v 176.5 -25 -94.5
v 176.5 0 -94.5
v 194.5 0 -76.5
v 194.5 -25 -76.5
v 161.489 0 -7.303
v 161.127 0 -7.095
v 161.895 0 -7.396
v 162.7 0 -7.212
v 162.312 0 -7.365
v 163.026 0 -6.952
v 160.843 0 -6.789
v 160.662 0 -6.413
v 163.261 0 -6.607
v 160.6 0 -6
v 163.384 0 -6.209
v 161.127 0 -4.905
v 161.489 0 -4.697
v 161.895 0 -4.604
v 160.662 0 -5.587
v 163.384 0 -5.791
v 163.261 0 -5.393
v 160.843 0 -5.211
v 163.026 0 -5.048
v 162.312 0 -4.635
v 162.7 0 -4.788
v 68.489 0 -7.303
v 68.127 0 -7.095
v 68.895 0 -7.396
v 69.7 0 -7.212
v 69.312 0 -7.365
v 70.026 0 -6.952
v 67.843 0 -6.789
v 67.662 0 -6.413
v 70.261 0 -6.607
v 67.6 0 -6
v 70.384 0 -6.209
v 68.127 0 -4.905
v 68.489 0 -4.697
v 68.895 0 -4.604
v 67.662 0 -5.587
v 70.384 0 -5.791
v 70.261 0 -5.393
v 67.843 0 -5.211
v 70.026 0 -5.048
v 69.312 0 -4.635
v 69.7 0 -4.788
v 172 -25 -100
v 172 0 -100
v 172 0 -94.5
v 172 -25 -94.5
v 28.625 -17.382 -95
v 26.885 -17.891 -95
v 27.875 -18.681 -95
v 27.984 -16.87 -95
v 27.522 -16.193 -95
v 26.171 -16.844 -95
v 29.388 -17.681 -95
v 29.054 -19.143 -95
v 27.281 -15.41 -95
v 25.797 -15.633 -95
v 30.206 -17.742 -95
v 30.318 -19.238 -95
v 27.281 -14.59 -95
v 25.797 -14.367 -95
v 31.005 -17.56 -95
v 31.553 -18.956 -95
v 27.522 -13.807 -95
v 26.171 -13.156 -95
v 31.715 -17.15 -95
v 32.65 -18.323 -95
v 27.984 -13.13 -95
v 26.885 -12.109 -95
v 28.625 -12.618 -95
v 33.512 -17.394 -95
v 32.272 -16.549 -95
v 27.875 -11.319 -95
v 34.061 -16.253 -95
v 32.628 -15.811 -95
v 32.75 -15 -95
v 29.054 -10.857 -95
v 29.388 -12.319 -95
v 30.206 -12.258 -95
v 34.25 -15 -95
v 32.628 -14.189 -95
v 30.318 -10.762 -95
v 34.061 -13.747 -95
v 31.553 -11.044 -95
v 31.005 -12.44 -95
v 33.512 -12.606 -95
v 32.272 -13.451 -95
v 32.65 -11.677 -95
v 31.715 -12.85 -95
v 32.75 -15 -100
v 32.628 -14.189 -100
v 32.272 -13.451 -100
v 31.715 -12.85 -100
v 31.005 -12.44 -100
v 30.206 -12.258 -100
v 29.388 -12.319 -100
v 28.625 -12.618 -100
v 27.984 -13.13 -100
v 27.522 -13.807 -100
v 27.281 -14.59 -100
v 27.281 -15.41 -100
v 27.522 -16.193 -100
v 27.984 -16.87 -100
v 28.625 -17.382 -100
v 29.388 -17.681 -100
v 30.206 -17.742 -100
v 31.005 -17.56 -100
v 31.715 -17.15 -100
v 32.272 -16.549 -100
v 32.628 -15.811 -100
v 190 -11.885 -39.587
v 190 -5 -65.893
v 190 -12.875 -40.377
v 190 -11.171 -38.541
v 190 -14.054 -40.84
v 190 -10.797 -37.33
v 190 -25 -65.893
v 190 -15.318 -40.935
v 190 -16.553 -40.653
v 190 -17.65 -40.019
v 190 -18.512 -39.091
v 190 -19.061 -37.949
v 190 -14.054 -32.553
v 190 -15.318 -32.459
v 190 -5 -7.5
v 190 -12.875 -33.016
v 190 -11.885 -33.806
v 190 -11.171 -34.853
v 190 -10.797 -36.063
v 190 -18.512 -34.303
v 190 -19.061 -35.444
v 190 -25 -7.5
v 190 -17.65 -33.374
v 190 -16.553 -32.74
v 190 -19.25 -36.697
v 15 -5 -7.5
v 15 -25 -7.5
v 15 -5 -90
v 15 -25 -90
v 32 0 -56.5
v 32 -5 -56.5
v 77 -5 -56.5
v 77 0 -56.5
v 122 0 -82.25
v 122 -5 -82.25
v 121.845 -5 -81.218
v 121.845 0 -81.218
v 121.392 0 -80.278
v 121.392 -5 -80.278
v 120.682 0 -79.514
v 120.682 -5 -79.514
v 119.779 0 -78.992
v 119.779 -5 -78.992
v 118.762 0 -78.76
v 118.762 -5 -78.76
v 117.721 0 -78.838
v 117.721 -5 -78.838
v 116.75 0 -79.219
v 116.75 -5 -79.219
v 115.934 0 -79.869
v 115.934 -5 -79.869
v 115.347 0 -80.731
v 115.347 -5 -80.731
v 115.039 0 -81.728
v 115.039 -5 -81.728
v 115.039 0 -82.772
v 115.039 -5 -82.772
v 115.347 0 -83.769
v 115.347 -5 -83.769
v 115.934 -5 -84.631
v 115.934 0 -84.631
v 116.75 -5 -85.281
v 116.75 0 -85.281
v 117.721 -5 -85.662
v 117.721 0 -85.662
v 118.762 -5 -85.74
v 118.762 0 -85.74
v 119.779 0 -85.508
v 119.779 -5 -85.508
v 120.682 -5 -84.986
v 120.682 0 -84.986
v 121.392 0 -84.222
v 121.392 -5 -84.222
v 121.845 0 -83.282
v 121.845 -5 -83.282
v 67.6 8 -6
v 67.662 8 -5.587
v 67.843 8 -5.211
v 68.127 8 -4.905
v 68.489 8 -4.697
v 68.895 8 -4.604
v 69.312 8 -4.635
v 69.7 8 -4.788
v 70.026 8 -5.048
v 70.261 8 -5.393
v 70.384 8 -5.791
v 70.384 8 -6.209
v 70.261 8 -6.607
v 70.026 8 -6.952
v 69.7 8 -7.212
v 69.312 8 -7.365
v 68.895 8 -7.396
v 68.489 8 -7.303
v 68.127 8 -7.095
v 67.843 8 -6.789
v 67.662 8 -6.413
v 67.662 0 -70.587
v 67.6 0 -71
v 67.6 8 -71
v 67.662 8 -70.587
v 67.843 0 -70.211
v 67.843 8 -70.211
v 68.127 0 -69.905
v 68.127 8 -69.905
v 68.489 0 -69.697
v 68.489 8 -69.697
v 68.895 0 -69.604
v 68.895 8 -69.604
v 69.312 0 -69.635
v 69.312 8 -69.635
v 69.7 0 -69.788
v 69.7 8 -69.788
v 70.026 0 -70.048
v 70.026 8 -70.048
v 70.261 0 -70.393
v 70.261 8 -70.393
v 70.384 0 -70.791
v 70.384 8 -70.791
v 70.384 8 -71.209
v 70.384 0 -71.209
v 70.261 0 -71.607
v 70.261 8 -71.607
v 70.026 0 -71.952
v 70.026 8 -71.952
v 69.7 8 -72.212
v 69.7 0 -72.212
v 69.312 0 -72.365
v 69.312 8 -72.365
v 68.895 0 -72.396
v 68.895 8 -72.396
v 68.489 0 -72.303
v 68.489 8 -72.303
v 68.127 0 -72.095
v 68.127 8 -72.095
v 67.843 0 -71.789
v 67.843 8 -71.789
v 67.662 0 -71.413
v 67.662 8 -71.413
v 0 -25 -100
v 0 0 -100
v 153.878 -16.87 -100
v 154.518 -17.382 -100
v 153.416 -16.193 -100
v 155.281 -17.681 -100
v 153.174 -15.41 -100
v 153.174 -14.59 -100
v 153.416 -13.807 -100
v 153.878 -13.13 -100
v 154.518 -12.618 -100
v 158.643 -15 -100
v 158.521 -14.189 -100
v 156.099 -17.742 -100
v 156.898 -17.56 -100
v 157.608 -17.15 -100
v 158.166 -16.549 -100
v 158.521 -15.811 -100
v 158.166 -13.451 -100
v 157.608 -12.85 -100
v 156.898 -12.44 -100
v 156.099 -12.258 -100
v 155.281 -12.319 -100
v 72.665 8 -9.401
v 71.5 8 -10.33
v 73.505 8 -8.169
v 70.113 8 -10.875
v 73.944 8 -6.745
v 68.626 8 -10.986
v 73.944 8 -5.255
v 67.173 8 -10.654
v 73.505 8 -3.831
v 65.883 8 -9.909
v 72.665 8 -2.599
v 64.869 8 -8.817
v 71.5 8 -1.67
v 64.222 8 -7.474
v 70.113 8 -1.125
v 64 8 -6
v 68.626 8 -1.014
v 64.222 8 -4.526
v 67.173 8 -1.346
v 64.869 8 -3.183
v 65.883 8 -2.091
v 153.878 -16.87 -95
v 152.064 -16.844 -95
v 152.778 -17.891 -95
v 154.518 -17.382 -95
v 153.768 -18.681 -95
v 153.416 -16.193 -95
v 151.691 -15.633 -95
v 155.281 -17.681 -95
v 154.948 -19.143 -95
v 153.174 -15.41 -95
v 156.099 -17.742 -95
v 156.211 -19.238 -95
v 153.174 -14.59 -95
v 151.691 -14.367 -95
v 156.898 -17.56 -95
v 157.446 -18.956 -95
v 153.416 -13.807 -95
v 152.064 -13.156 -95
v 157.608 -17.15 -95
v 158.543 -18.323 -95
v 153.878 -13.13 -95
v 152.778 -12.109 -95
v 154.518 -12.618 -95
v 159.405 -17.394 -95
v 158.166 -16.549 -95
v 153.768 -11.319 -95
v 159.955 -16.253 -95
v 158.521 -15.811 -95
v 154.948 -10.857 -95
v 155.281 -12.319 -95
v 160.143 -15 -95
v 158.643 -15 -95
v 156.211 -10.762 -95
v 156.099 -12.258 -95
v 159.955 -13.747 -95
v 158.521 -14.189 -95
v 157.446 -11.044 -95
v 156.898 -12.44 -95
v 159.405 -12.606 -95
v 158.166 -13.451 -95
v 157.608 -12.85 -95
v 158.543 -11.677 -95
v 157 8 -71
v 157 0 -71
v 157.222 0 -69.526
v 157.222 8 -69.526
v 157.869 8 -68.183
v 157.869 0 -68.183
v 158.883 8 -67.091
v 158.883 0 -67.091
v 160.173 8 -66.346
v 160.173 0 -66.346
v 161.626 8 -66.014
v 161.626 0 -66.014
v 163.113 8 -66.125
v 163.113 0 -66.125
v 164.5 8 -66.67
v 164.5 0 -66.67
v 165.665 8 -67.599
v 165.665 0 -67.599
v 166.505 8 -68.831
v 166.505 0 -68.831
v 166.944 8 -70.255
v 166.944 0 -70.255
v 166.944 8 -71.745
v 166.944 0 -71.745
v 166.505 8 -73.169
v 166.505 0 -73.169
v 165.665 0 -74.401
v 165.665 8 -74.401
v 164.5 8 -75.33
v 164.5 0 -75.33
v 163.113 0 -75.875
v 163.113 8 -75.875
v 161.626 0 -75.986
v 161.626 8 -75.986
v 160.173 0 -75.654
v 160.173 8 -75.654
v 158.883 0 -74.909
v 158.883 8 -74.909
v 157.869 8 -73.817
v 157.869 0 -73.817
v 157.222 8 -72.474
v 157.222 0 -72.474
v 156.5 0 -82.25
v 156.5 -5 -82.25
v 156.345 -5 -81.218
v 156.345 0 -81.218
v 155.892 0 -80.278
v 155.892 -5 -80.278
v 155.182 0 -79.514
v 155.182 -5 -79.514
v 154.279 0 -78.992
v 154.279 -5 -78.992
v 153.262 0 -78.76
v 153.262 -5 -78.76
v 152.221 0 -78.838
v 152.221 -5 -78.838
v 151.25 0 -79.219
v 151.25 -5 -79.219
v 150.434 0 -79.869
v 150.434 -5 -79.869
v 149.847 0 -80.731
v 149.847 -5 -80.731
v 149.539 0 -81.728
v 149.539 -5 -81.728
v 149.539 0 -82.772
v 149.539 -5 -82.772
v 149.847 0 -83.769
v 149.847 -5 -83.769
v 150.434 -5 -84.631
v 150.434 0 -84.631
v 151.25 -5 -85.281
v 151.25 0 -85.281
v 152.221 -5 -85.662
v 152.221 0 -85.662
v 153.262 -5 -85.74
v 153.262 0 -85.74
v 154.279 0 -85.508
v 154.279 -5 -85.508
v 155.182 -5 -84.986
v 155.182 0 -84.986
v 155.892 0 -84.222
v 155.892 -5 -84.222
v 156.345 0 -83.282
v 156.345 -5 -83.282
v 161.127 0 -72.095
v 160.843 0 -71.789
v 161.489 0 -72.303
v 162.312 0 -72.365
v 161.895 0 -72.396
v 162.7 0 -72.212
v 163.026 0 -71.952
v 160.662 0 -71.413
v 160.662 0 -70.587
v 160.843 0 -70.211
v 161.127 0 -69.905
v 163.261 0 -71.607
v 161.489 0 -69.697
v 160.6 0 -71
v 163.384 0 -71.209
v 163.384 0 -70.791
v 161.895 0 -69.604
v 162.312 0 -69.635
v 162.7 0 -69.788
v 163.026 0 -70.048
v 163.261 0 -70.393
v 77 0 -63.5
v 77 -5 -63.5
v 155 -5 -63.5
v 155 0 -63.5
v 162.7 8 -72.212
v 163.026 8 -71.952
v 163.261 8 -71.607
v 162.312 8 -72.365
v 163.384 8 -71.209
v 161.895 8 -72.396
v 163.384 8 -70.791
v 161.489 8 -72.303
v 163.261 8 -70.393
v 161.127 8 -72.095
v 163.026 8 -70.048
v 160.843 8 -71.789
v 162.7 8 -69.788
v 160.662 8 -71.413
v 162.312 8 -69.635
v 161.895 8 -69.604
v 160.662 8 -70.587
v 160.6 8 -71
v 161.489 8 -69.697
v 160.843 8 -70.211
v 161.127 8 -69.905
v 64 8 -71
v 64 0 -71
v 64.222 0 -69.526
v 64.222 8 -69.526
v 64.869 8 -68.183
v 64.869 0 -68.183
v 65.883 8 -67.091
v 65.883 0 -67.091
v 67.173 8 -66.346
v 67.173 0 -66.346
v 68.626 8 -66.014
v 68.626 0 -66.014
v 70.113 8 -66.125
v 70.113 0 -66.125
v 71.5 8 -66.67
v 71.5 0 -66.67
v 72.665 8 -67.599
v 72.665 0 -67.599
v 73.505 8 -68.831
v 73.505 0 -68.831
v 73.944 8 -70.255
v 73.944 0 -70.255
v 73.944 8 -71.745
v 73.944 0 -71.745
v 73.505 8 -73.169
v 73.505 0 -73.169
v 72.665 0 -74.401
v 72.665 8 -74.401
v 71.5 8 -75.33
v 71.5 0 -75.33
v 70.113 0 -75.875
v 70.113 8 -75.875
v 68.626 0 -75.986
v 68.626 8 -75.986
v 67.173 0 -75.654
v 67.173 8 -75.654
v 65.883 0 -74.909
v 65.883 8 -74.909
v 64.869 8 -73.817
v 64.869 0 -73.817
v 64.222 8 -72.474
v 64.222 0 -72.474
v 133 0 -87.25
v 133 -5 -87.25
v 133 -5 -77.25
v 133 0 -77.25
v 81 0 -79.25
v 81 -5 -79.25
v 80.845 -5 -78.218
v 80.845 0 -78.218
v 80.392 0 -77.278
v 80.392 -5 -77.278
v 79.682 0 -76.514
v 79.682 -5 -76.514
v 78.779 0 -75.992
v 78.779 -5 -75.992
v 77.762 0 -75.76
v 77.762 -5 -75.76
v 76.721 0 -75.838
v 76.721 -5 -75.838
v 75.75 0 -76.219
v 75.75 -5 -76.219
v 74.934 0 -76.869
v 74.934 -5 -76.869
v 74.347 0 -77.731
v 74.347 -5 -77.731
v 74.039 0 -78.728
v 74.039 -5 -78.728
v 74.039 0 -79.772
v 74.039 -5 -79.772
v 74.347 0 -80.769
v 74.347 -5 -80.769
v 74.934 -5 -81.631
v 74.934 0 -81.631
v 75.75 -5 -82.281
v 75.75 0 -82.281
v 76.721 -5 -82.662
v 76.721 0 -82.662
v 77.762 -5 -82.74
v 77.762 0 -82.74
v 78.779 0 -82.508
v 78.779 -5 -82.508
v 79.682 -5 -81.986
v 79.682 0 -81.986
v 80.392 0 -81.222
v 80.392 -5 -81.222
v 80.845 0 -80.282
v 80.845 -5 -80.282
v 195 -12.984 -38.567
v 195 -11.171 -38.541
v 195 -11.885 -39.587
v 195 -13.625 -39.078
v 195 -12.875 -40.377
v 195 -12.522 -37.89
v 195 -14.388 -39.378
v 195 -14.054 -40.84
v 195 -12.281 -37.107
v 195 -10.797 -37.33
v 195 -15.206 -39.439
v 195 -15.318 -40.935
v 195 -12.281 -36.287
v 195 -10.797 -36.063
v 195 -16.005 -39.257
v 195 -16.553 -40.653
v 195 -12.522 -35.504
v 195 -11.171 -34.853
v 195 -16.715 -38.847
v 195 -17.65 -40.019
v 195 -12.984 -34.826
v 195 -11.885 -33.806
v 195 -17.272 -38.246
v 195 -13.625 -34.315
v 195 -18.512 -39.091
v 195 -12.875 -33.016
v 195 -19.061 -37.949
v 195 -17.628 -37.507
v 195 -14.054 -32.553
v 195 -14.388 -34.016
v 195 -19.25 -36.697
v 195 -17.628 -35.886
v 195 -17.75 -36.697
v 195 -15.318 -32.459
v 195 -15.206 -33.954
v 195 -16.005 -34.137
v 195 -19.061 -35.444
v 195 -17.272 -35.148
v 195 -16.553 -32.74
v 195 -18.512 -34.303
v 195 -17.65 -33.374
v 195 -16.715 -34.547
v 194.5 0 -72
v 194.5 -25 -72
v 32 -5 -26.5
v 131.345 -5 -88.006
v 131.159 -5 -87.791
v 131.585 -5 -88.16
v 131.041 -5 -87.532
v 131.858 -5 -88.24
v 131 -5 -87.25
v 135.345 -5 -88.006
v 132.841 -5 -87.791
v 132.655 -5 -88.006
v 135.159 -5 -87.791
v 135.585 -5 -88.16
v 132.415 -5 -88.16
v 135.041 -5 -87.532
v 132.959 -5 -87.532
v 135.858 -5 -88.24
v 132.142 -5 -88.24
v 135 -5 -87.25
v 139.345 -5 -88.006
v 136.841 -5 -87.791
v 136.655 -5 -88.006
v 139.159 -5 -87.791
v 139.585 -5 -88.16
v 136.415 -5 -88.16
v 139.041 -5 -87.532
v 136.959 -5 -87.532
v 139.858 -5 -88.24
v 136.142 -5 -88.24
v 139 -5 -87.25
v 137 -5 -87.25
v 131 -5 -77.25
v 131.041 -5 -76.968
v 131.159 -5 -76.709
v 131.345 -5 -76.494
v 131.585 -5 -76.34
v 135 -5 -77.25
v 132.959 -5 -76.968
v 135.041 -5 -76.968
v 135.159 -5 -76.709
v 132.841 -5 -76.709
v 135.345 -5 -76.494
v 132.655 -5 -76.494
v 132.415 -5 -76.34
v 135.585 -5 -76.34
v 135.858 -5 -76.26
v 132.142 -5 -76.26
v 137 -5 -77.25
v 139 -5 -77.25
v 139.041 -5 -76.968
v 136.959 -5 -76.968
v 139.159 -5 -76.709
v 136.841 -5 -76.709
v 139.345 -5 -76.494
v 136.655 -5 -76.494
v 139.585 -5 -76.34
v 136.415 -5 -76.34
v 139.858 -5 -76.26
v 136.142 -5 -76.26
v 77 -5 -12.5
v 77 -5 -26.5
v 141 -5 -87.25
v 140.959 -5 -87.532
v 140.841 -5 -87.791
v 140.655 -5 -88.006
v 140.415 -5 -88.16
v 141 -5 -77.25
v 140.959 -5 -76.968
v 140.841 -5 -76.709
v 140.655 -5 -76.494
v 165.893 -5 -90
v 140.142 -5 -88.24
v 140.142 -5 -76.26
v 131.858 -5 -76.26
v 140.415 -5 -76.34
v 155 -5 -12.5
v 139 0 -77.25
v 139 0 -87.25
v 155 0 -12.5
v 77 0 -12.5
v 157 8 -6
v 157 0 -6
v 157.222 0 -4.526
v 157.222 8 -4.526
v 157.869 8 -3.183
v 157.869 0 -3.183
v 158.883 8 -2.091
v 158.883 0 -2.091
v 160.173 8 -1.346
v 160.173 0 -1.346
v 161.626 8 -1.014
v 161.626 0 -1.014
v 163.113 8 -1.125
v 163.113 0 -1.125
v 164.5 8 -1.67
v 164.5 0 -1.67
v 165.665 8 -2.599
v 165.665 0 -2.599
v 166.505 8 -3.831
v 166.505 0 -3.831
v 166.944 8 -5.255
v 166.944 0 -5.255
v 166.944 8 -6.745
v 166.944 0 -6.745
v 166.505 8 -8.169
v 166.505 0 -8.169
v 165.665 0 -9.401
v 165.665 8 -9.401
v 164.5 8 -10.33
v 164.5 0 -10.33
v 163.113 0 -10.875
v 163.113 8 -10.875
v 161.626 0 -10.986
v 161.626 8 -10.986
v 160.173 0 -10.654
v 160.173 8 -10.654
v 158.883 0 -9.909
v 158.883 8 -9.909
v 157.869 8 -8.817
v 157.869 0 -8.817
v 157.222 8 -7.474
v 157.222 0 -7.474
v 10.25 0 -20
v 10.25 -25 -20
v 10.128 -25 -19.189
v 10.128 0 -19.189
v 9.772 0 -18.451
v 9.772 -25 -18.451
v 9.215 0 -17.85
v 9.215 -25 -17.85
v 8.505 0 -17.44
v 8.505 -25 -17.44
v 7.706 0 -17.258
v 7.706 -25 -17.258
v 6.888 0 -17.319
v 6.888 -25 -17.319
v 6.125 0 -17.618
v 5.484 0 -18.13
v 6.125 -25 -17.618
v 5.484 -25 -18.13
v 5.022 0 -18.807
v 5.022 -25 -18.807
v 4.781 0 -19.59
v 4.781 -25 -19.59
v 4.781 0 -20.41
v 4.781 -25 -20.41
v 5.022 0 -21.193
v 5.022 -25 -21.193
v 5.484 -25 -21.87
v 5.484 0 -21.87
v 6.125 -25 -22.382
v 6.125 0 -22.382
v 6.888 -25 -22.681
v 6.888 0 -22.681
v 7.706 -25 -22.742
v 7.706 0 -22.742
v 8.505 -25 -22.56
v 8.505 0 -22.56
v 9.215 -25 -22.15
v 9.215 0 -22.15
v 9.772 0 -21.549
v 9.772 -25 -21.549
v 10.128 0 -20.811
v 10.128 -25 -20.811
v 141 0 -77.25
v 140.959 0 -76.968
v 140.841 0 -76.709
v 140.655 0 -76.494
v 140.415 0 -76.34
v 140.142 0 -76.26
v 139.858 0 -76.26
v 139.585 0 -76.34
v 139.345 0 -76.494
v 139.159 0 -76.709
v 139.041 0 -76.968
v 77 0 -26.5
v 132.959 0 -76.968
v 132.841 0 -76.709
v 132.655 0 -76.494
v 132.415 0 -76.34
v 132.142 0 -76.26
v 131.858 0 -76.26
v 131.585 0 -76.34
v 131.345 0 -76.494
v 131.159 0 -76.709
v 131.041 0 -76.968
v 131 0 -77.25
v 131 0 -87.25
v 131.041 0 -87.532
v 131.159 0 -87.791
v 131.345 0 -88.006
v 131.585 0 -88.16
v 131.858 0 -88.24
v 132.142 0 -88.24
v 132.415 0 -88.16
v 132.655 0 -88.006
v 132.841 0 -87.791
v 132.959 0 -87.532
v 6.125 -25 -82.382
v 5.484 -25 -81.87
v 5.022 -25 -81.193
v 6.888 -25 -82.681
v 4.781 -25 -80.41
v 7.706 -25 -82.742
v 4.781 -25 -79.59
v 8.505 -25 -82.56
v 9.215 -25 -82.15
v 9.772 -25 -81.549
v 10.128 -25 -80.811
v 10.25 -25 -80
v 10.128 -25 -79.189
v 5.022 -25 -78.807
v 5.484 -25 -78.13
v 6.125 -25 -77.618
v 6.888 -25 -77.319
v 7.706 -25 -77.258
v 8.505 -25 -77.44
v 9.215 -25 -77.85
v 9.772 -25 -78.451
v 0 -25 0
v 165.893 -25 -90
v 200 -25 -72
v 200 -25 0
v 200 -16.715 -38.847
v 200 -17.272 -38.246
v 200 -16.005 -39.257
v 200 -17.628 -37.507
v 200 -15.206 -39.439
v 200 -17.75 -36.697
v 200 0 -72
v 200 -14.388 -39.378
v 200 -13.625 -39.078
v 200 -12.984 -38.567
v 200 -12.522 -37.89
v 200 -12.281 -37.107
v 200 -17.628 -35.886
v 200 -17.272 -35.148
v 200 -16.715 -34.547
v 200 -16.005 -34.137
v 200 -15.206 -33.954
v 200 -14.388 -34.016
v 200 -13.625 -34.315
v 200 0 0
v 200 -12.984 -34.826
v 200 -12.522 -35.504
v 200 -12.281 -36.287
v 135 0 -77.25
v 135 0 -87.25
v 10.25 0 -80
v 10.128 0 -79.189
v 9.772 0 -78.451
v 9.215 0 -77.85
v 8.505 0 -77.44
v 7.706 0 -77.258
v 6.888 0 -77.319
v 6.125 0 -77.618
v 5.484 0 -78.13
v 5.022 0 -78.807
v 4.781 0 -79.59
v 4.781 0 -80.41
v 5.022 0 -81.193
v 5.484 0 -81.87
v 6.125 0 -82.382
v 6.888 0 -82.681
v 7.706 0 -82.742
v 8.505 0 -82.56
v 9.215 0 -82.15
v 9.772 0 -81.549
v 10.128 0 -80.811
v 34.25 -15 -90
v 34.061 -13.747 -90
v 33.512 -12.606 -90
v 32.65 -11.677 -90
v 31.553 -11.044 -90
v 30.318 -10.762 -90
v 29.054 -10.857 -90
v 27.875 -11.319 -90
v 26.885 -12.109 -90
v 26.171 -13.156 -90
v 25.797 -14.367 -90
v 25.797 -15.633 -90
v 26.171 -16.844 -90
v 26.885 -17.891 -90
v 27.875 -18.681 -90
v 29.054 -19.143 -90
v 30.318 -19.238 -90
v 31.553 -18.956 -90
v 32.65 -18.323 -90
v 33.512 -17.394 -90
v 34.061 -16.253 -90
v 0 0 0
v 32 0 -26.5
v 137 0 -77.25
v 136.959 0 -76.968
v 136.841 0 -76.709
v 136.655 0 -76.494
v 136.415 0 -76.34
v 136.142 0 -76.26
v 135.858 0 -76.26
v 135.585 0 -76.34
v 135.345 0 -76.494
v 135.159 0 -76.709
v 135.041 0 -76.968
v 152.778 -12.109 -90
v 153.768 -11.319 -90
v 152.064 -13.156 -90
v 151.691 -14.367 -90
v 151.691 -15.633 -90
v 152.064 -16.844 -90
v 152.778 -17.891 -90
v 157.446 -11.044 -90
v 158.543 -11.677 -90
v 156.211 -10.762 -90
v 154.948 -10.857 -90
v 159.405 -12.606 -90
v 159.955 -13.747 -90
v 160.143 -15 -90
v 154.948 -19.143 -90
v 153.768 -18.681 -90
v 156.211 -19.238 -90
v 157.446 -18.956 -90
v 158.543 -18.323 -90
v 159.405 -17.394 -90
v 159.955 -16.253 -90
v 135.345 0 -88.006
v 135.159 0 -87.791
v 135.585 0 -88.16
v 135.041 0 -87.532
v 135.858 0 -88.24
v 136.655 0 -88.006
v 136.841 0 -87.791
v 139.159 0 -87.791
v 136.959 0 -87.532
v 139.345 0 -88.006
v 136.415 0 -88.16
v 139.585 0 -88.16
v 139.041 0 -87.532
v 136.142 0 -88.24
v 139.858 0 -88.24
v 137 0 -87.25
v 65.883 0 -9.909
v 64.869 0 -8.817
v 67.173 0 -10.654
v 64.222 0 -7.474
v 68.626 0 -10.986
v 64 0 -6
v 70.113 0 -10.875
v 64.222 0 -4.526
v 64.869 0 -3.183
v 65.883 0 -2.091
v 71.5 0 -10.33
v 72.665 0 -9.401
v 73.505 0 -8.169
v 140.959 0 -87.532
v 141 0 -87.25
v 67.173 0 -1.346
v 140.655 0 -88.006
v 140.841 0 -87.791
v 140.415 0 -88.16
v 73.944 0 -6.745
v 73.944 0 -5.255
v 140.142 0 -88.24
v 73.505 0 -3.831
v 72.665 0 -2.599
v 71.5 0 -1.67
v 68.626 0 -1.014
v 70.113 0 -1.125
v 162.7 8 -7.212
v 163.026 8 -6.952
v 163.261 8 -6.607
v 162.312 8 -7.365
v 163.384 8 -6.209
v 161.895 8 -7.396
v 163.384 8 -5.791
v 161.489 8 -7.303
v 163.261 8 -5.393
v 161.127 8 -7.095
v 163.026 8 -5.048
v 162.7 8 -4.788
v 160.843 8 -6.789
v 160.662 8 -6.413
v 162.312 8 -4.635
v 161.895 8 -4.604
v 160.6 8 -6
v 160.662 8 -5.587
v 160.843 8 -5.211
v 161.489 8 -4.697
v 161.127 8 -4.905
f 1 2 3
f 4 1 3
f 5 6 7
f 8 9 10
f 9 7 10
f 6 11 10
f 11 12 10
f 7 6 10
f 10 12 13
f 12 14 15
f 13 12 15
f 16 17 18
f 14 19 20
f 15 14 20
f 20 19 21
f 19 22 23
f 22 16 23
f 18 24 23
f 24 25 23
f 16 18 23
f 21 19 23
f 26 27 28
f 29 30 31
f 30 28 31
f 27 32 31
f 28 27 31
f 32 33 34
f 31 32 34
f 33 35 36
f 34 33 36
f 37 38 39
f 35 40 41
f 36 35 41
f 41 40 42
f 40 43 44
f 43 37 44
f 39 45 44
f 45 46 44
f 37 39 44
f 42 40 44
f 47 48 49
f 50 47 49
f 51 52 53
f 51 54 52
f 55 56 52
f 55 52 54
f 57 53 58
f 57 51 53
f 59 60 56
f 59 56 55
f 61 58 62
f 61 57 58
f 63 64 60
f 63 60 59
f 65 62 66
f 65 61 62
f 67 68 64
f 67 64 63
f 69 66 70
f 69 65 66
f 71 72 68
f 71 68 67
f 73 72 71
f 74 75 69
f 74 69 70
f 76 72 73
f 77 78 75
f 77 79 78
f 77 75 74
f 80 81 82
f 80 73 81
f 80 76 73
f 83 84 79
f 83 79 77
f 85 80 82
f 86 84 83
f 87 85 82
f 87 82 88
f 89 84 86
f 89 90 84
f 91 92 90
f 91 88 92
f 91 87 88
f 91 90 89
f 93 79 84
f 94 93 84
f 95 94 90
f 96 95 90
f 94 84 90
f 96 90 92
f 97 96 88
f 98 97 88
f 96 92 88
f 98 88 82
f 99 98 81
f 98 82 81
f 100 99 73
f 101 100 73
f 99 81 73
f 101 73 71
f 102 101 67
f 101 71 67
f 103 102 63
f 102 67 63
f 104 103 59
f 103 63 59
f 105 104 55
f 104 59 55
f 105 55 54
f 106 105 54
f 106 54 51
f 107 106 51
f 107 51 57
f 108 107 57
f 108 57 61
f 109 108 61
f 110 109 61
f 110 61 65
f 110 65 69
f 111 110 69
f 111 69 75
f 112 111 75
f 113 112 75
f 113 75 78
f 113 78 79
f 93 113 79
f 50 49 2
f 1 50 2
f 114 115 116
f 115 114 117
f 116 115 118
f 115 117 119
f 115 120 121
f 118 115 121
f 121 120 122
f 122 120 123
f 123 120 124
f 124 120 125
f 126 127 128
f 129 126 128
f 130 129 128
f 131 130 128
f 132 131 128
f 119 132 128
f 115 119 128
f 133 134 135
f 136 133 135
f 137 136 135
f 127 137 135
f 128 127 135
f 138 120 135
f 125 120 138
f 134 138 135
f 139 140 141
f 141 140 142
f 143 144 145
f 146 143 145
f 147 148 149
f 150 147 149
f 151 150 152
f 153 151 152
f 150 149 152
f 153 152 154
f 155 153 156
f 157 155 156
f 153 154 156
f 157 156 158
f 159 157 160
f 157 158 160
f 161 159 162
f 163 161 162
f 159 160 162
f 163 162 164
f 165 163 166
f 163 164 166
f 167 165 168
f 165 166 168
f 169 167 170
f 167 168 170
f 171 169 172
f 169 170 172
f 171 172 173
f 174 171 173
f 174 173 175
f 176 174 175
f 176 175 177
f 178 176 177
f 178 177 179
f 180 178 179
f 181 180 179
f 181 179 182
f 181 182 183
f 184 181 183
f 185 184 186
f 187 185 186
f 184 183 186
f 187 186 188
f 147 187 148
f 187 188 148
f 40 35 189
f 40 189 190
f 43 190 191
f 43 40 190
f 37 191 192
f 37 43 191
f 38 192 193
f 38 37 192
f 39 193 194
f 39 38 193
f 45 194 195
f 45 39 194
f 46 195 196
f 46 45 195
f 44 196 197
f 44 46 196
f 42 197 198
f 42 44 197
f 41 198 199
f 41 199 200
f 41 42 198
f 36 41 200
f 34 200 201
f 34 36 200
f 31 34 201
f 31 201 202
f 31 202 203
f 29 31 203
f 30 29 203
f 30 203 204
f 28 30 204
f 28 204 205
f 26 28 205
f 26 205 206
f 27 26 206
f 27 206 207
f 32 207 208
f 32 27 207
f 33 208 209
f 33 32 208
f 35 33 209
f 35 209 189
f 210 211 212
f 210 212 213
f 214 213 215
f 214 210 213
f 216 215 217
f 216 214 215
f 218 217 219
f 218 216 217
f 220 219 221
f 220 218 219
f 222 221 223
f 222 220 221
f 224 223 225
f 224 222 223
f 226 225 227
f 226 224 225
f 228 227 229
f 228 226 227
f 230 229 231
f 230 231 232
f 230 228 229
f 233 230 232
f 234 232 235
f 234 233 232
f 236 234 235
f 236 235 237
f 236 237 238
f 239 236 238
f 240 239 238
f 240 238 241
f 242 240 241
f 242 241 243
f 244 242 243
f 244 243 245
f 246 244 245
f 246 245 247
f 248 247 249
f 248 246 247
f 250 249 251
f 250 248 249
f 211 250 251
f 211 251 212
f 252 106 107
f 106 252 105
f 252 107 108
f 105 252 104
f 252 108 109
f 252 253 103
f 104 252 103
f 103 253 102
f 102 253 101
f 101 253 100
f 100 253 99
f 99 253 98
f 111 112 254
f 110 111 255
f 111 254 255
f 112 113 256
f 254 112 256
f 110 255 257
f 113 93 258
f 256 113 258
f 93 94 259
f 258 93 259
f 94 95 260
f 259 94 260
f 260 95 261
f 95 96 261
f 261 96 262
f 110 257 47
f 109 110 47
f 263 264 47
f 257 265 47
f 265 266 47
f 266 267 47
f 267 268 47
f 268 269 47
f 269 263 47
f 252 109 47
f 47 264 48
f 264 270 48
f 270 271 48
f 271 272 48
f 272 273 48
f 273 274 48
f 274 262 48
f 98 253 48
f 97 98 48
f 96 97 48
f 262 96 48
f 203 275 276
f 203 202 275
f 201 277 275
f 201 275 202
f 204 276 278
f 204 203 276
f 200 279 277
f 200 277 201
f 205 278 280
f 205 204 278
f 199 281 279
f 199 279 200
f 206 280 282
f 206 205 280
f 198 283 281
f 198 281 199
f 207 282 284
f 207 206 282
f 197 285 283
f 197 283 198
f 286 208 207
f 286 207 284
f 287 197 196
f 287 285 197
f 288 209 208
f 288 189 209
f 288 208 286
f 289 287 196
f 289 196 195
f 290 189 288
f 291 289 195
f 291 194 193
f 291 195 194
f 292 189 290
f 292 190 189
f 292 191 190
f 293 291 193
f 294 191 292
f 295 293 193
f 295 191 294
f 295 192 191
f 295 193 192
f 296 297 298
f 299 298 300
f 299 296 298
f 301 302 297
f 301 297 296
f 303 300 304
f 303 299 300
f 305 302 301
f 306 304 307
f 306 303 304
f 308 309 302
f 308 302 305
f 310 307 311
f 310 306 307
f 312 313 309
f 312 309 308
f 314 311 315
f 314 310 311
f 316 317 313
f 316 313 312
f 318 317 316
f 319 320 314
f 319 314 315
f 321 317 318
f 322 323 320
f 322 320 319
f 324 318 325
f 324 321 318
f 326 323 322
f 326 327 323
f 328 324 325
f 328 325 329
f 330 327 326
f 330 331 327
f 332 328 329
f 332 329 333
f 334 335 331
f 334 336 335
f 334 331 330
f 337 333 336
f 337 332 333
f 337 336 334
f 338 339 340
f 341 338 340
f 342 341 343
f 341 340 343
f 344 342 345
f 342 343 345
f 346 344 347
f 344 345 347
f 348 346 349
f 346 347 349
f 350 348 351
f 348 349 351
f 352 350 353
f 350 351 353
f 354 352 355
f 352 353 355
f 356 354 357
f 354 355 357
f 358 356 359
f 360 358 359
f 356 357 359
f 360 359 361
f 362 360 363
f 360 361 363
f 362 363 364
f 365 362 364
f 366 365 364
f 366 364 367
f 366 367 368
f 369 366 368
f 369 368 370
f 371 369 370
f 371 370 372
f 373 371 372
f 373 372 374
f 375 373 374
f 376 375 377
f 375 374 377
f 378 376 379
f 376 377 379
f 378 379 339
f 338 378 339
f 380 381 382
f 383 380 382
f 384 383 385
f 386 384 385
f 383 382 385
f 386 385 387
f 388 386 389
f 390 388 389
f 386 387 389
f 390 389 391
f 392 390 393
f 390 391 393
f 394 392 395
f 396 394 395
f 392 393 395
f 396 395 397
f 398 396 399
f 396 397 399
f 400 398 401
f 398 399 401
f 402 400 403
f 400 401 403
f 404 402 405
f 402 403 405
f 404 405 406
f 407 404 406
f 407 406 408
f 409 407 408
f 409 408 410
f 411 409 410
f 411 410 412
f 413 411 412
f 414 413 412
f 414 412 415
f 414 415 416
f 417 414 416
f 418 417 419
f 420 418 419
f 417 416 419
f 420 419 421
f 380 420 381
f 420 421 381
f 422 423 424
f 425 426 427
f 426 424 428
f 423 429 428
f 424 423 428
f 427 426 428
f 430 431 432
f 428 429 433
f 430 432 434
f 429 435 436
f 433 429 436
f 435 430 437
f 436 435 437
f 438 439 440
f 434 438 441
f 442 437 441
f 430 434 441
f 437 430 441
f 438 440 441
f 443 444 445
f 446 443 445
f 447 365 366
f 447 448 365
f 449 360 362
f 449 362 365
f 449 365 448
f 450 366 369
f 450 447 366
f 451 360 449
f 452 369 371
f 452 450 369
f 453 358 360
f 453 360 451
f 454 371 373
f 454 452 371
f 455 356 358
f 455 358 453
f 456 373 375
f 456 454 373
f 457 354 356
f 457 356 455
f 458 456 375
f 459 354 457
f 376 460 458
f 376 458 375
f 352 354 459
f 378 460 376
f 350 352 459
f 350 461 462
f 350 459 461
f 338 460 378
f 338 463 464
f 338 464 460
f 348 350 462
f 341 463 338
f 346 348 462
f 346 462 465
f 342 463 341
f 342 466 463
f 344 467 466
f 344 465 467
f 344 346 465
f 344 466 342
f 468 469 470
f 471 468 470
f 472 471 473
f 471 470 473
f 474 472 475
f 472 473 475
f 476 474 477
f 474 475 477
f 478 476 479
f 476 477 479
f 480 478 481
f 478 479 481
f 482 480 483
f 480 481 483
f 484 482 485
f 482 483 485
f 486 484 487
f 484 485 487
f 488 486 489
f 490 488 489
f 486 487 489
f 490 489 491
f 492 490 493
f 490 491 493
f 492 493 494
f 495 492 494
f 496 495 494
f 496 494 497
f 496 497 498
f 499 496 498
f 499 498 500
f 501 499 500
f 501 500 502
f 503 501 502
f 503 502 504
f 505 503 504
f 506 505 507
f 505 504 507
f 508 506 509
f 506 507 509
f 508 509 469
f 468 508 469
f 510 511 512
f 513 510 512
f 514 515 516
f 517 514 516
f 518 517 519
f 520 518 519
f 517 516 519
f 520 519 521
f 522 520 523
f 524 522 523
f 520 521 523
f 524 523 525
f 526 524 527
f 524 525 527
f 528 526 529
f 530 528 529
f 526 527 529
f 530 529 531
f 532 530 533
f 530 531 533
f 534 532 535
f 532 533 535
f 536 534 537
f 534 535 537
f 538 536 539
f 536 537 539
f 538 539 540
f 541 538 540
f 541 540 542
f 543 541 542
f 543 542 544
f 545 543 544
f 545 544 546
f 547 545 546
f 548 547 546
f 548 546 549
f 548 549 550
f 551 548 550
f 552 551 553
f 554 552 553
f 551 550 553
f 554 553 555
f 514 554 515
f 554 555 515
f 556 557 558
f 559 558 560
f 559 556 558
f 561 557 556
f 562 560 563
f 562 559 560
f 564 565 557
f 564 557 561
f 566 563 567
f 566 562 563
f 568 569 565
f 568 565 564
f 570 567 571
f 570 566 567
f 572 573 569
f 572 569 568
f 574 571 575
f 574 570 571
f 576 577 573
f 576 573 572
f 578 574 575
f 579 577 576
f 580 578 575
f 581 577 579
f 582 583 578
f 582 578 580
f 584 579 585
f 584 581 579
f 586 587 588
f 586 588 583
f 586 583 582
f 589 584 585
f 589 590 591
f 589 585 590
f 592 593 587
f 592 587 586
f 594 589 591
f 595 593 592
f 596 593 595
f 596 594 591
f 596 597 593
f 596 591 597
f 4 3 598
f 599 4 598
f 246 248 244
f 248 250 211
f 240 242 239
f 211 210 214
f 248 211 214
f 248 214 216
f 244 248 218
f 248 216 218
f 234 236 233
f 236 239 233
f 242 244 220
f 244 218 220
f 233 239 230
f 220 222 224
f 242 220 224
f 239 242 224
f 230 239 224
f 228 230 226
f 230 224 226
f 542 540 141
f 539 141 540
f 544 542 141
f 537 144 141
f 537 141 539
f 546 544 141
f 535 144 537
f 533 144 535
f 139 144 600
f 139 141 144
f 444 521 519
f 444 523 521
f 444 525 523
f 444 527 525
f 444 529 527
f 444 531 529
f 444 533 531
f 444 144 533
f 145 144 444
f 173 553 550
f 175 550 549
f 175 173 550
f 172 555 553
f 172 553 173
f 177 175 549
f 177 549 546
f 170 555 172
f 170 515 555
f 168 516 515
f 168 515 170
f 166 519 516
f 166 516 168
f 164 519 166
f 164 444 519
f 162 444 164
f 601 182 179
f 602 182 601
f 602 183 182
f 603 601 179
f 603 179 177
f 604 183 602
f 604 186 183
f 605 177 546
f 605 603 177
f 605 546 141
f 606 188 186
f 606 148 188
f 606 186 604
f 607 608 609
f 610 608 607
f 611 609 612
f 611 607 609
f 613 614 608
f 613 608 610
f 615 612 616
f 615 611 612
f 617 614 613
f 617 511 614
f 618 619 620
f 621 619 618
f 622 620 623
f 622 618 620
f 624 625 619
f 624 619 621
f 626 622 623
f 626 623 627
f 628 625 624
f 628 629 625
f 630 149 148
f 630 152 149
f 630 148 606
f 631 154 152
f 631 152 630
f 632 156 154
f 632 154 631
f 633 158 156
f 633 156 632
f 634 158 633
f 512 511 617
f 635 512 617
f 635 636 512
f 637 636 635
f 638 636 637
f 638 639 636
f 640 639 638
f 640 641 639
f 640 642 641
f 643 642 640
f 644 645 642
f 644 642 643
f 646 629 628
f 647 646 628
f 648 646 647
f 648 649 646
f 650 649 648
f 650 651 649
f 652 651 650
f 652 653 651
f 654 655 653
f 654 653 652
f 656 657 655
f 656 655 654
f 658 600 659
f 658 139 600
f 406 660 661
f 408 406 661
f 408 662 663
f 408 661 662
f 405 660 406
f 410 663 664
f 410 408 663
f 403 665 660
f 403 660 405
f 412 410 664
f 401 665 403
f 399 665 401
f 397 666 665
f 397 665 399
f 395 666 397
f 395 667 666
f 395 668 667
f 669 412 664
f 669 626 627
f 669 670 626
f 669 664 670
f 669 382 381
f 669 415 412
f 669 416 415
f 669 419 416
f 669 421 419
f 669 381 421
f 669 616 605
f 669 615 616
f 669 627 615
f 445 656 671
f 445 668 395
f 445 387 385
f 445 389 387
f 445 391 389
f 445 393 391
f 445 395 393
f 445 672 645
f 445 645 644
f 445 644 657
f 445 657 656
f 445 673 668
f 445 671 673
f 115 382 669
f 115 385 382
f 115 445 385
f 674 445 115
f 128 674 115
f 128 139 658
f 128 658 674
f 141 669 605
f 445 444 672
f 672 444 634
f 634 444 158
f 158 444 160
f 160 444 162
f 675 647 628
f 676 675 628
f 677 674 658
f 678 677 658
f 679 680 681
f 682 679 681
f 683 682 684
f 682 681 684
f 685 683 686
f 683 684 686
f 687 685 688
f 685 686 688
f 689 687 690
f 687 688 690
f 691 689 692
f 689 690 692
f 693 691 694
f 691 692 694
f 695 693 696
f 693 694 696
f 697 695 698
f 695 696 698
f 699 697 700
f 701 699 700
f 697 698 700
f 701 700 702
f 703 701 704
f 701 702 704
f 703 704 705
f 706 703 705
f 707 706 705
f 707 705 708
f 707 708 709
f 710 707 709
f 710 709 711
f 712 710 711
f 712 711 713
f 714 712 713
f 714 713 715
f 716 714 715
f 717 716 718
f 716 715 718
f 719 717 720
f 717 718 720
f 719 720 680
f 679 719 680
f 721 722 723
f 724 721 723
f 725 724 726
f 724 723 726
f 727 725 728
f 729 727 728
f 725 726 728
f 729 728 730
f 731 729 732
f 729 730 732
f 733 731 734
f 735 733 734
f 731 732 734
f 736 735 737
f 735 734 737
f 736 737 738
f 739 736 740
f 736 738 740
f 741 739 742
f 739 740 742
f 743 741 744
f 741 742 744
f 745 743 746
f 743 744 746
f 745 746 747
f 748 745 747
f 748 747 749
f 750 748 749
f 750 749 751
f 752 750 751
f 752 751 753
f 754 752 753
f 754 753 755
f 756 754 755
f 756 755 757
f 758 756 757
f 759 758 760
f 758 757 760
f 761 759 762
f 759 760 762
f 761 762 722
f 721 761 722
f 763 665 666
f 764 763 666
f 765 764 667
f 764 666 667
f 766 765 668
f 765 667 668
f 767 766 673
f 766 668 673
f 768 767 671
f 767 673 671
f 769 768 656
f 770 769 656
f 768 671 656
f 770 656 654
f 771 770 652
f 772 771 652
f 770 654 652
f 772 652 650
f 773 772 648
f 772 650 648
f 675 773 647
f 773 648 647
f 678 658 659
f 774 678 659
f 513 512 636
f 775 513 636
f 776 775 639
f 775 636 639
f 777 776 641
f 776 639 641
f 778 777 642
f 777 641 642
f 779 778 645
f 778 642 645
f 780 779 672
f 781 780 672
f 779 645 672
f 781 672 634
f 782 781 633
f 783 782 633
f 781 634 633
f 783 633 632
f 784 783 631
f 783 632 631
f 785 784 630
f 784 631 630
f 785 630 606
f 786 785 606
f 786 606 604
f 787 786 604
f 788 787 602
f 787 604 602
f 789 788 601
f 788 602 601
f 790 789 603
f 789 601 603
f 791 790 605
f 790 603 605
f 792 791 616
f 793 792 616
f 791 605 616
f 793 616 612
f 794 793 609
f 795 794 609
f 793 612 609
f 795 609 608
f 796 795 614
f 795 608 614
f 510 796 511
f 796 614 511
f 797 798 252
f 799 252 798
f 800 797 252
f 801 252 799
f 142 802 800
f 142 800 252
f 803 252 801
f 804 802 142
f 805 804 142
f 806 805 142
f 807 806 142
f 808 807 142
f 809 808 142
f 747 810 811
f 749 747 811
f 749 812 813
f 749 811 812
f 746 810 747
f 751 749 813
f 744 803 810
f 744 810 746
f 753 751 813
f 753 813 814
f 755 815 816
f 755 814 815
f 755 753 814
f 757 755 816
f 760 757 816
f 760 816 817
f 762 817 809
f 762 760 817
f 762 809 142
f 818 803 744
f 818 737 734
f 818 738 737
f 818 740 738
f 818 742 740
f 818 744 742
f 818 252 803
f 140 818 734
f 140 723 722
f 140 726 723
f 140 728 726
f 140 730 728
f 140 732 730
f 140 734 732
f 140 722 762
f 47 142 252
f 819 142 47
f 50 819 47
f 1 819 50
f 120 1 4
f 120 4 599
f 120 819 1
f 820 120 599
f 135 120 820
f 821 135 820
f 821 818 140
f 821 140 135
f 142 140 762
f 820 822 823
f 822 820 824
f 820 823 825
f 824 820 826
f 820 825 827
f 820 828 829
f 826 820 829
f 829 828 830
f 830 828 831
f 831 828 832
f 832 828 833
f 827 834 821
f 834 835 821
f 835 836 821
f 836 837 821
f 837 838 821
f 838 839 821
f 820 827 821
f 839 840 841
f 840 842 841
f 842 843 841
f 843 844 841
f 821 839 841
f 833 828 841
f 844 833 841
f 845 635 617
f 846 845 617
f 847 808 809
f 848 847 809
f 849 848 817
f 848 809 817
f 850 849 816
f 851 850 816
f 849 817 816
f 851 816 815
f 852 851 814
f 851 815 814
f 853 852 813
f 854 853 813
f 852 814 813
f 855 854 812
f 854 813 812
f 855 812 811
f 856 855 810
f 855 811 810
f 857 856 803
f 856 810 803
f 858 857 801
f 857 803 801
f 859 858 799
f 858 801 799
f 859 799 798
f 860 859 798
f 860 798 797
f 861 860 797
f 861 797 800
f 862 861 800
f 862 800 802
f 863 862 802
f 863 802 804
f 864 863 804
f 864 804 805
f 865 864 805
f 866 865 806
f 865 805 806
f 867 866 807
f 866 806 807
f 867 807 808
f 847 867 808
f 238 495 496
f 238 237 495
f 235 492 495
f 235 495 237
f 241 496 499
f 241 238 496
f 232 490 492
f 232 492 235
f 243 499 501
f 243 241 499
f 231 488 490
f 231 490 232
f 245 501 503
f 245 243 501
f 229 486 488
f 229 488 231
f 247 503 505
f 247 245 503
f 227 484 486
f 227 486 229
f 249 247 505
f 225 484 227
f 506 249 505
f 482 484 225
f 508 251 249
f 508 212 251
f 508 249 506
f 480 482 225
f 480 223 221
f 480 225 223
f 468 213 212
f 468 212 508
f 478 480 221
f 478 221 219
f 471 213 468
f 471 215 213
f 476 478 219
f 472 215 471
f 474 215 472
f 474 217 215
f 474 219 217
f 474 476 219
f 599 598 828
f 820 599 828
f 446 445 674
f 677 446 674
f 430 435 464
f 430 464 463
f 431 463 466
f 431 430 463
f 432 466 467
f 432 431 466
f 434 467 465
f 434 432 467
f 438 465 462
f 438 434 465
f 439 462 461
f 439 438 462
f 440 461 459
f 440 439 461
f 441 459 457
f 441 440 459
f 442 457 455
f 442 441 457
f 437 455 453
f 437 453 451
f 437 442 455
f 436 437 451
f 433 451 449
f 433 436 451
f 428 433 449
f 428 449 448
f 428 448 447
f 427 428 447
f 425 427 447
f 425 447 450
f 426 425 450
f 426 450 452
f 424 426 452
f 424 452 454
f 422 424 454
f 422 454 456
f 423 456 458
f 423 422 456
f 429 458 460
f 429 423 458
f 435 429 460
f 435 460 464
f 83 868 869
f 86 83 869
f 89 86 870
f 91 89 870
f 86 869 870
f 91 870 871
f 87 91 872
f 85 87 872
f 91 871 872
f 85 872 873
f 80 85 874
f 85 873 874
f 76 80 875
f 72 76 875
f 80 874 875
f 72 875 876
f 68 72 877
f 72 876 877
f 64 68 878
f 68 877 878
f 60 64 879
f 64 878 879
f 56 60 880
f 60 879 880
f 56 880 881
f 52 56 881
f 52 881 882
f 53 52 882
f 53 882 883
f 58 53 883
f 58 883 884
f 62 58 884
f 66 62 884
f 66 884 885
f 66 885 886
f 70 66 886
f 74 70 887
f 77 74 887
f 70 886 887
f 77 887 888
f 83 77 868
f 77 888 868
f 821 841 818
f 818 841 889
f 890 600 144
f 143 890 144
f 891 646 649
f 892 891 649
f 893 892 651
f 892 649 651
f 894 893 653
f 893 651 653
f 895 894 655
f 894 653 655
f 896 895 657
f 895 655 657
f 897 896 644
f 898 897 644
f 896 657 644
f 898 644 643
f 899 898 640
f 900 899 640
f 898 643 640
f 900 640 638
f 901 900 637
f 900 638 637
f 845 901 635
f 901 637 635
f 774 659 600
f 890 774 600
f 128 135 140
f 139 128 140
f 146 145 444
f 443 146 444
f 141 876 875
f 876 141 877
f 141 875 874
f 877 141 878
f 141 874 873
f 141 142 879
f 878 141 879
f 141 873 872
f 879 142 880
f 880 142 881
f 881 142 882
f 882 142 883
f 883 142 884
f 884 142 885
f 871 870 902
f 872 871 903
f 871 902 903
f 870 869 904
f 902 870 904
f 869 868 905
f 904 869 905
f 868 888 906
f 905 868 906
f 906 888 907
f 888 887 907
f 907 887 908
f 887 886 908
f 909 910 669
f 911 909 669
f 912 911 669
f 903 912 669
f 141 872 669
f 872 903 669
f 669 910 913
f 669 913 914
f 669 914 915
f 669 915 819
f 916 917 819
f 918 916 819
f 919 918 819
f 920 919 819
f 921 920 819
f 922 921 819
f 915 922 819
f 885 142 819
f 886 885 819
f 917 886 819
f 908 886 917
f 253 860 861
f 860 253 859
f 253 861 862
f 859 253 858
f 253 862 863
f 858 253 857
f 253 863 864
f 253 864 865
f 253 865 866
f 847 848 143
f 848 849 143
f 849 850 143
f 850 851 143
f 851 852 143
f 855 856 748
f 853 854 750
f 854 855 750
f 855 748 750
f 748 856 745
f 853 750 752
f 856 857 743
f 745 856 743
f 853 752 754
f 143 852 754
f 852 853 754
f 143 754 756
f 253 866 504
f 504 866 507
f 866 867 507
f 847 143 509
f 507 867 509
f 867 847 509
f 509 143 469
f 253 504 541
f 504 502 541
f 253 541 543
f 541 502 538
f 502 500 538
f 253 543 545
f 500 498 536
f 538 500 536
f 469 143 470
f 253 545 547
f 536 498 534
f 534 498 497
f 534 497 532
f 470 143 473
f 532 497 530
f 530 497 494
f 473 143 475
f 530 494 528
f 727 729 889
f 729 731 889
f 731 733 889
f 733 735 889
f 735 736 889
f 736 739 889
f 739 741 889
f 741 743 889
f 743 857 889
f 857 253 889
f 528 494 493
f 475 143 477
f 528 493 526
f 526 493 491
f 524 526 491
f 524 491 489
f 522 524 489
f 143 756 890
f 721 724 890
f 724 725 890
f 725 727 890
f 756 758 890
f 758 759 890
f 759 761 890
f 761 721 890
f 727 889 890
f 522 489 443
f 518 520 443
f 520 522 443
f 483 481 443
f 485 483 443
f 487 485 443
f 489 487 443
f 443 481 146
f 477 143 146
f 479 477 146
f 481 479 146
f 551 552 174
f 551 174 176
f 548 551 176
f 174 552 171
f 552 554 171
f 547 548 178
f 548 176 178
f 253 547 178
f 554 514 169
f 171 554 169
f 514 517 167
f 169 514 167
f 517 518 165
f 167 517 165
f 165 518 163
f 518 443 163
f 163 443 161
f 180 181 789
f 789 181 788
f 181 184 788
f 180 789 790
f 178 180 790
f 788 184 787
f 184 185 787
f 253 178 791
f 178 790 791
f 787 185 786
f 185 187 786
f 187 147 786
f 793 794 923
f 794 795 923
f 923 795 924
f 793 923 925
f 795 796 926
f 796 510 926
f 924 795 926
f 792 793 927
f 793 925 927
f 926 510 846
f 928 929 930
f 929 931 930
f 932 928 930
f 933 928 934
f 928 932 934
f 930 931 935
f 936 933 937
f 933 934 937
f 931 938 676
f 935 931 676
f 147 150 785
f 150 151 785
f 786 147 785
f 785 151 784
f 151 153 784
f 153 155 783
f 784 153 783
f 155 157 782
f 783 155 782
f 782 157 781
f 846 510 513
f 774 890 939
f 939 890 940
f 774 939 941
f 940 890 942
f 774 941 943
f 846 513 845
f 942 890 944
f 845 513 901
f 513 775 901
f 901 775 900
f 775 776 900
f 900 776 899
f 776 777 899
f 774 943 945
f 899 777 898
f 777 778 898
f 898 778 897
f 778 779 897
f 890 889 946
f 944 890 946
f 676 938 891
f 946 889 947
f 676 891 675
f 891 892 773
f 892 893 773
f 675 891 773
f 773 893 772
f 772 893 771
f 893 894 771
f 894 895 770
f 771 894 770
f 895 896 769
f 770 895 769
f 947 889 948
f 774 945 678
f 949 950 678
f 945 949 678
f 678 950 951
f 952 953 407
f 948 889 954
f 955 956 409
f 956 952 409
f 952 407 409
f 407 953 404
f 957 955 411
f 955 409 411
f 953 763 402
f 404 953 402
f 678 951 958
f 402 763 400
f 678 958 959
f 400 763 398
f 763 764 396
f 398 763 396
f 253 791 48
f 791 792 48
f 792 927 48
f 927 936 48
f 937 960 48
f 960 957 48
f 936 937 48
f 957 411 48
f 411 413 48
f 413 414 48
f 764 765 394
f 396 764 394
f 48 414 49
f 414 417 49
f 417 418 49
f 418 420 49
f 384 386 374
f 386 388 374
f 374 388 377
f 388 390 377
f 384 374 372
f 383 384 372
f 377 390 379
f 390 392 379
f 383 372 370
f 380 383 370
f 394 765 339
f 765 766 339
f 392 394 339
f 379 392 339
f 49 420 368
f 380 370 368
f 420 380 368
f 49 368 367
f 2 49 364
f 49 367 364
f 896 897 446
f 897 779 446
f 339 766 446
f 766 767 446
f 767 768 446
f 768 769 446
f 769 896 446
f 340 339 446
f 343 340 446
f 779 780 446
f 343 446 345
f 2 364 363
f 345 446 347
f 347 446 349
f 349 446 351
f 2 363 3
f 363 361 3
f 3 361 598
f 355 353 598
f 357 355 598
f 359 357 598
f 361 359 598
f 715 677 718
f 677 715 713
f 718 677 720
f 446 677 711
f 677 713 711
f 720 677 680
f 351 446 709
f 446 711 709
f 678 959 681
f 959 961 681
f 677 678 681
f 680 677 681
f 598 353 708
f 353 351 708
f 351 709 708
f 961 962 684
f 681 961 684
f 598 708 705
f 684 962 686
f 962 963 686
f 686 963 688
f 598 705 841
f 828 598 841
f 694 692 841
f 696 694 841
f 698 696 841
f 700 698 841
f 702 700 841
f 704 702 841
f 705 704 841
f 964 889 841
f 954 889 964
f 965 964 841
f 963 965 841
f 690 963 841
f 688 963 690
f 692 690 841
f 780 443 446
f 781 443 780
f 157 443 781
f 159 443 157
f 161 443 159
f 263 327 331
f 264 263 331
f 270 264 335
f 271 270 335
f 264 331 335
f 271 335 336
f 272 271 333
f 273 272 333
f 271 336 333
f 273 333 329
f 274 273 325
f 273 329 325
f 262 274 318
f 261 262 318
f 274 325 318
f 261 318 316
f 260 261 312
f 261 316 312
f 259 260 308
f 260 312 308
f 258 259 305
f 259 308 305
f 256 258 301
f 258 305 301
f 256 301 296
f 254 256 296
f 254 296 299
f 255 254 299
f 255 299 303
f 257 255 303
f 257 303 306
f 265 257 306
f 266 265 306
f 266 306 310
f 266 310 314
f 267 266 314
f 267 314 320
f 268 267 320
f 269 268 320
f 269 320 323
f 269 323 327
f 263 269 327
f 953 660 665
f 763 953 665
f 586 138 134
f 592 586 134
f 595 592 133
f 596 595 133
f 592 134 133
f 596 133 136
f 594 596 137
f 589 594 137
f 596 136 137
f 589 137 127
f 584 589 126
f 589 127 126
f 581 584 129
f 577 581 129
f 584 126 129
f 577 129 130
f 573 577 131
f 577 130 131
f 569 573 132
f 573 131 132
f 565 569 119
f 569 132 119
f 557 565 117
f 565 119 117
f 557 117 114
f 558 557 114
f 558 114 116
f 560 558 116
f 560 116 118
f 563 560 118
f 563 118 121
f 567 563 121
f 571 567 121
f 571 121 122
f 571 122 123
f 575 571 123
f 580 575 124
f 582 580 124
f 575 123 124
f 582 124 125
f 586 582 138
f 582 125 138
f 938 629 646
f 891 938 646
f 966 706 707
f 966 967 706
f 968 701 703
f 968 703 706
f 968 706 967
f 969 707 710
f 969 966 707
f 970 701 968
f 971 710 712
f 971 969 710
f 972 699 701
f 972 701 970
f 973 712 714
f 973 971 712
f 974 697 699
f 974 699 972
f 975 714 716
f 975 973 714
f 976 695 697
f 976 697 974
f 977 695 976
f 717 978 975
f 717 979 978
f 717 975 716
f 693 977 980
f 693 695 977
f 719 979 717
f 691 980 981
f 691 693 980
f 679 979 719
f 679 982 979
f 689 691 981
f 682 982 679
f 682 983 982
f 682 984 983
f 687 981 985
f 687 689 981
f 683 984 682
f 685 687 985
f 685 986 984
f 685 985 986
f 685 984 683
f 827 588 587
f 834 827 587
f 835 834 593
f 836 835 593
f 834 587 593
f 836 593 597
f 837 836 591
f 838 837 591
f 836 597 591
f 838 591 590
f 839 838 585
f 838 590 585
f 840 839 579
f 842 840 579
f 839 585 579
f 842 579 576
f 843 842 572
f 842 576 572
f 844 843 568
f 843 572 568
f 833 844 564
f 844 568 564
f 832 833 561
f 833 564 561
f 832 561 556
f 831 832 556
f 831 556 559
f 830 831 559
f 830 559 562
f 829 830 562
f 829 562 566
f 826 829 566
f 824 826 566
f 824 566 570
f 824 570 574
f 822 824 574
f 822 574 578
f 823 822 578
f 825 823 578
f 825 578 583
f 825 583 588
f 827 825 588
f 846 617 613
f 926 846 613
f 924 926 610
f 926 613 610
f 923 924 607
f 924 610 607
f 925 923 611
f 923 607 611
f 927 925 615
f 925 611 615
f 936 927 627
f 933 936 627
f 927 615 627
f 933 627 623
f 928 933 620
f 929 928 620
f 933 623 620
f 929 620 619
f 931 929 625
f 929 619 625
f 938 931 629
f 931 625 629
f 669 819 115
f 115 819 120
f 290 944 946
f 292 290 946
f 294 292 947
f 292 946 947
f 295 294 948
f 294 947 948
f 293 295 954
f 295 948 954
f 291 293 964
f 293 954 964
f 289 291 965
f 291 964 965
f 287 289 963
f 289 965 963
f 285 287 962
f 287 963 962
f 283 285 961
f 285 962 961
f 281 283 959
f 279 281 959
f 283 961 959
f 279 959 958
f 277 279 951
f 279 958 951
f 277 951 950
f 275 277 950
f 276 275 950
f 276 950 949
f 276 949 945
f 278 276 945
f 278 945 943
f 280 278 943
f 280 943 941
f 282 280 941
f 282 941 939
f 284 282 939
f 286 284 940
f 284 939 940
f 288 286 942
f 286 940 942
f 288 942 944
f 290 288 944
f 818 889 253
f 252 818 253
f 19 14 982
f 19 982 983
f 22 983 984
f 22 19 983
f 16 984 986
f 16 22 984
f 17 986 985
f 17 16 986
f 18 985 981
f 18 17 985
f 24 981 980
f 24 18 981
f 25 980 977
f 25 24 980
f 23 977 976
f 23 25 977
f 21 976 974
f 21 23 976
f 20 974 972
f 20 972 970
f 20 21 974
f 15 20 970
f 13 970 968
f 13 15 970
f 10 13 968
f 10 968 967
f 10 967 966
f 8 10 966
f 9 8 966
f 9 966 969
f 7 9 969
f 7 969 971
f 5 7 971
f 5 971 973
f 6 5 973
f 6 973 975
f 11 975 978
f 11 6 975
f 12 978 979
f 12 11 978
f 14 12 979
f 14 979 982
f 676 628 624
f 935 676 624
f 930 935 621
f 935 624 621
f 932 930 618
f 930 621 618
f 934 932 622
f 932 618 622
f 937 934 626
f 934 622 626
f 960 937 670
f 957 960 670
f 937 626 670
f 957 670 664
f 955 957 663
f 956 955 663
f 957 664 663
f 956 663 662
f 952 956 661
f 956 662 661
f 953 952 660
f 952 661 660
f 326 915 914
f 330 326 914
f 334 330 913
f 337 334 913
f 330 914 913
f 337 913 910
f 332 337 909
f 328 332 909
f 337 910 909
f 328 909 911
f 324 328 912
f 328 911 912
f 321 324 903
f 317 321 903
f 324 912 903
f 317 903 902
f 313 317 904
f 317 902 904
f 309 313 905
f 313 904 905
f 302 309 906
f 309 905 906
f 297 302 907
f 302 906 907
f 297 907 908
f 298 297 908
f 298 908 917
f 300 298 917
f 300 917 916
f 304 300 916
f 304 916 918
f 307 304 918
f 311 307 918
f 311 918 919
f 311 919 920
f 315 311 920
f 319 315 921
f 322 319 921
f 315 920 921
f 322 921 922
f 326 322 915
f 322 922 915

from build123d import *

# Parameters (mm, degrees)
F1_DEPTH  = 25
F3_DEPTH  = 20
F4_R      = 3.5
F5_DEPTH  = 5
F6_R      = 5
F6_R_2    = 1.4
F7_DEPTH  = 8
F8_R      = 2.75
F9_DEPTH  = 10
F10_R     = 4.25
F11_DEPTH = 5
F12_R     = 2.75
F13_DEPTH = 10
F14_R     = 4.25
F15_DEPTH = 5
F16_R     = 2.75
F17_DEPTH = 25


with BuildPart() as f1:
    # F0 (on Front) → F1 (new body)
    with BuildSketch(Plane.XZ):
        Polygon((200, 0), (0, 0), (0, -100), (172, -100), (172, -94.5), (176.5, -94.5), (194.5, -76.5), (194.5, -72), (200, -72), align=None)
    extrude(amount=F1_DEPTH)

    # F2 (on face) → F3 (cut)
    with BuildSketch(Plane.XZ.offset(25)):
        Polygon((190, -7.5), (15, -7.5), (15, -90), (165.893398, -90), (190, -65.893398), align=None)
    extrude(amount=-F3_DEPTH, mode=Mode.SUBTRACT)

    # F4 (on face) → F5 (cut, through all)
    with BuildSketch(Plane.XZ.offset(5)):
        Polygon((155, -12.5), (77, -12.5), (77, -26.5), (32, -26.5), (32, -56.5), (77, -56.5), (77, -63.5), (155, -63.5), align=None)
        with Locations((153, -82.25)):
            Circle(F4_R)
        with Locations((118.5, -82.25)):
            Circle(F4_R)
        with BuildLine():
            Line((133, -82.25), (133, -77.25))
            ThreePointArc((133, -77.25), (132, -76.25), (131, -77.25))
            Line((131, -77.25), (131, -82.25))
            Line((131, -82.25), (131, -87.25))
            ThreePointArc((131, -87.25), (132, -88.25), (133, -87.25))
            Line((133, -87.25), (133, -82.25))
        make_face()
        with BuildLine():
            ThreePointArc((137, -77.25), (136, -76.25), (135, -77.25))
            Line((135, -77.25), (135, -82.25))
            Line((135, -82.25), (135, -87.25))
            ThreePointArc((135, -87.25), (136, -88.25), (137, -87.25))
            Line((137, -87.25), (137, -82.25))
            Line((137, -82.25), (137, -77.25))
        make_face()
        with BuildLine():
            ThreePointArc((141, -77.25), (140, -76.25), (139, -77.25))
            Line((139, -77.25), (139, -82.25))
            Line((139, -82.25), (139, -87.25))
            ThreePointArc((139, -87.25), (140, -88.25), (141, -87.25))
            Line((141, -87.25), (141, -82.25))
            Line((141, -82.25), (141, -77.25))
        make_face()
        with Locations((77.5, -79.25)):
            Circle(F4_R)
    extrude(amount=-F5_DEPTH, mode=Mode.SUBTRACT)

    # F6 (on face) → F7 (join)
    with BuildSketch(Plane(origin=(0, 0, 0), x_dir=(-1, 0, 0), z_dir=(0, 1, 0))):
        with Locations((-69, -6)):
            Circle(F6_R)
        with Locations((-69, -6)):
            Circle(F6_R_2, mode=Mode.SUBTRACT)
        with Locations((-162, -6)):
            Circle(F6_R)
        with Locations((-162, -6)):
            Circle(F6_R_2, mode=Mode.SUBTRACT)
        with Locations((-162, -71)):
            Circle(F6_R)
        with Locations((-162, -71)):
            Circle(F6_R_2, mode=Mode.SUBTRACT)
        with Locations((-69, -71)):
            Circle(F6_R)
        with Locations((-69, -71)):
            Circle(F6_R_2, mode=Mode.SUBTRACT)
    extrude(amount=F7_DEPTH)

    # F8 (on face) → F9 (cut, through all)
    with BuildSketch(Plane(origin=(190, 0, 0), x_dir=(0, -1, 0), z_dir=(-1, 0, 0))):
        with Locations((15, -36.696699)):
            Circle(F8_R)
    extrude(amount=-F9_DEPTH, mode=Mode.SUBTRACT)

    # F10 (on face) → F11 (cut)
    with BuildSketch(Plane(origin=(190, 0, 0), x_dir=(0, -1, 0), z_dir=(-1, 0, 0))):
        with Locations((15, -36.696699)):
            Circle(F10_R)
    extrude(amount=-F11_DEPTH, mode=Mode.SUBTRACT)

    # F12 (on face) → F13 (cut, through all)
    with BuildSketch(Plane.XY.offset(-90)):
        with Locations((30, -15)):
            Circle(F12_R)
        with Locations((155.893398, -15)):
            Circle(F12_R)
    extrude(amount=-F13_DEPTH, mode=Mode.SUBTRACT)

    # F14 (on face) → F15 (cut)
    with BuildSketch(Plane.XY.offset(-90)):
        with Locations((30, -15)):
            Circle(F14_R)
        with Locations((155.893398, -15)):
            Circle(F14_R)
    extrude(amount=-F15_DEPTH, mode=Mode.SUBTRACT)

    # F16 (on face) → F17 (cut, through all)
    with BuildSketch(Plane.XZ.offset(25)):
        with Locations((7.5, -20)):
            Circle(F16_R)
        with Locations((7.5, -80)):
            Circle(F16_R)
    extrude(amount=-F17_DEPTH, mode=Mode.SUBTRACT)


solid = f1.part
